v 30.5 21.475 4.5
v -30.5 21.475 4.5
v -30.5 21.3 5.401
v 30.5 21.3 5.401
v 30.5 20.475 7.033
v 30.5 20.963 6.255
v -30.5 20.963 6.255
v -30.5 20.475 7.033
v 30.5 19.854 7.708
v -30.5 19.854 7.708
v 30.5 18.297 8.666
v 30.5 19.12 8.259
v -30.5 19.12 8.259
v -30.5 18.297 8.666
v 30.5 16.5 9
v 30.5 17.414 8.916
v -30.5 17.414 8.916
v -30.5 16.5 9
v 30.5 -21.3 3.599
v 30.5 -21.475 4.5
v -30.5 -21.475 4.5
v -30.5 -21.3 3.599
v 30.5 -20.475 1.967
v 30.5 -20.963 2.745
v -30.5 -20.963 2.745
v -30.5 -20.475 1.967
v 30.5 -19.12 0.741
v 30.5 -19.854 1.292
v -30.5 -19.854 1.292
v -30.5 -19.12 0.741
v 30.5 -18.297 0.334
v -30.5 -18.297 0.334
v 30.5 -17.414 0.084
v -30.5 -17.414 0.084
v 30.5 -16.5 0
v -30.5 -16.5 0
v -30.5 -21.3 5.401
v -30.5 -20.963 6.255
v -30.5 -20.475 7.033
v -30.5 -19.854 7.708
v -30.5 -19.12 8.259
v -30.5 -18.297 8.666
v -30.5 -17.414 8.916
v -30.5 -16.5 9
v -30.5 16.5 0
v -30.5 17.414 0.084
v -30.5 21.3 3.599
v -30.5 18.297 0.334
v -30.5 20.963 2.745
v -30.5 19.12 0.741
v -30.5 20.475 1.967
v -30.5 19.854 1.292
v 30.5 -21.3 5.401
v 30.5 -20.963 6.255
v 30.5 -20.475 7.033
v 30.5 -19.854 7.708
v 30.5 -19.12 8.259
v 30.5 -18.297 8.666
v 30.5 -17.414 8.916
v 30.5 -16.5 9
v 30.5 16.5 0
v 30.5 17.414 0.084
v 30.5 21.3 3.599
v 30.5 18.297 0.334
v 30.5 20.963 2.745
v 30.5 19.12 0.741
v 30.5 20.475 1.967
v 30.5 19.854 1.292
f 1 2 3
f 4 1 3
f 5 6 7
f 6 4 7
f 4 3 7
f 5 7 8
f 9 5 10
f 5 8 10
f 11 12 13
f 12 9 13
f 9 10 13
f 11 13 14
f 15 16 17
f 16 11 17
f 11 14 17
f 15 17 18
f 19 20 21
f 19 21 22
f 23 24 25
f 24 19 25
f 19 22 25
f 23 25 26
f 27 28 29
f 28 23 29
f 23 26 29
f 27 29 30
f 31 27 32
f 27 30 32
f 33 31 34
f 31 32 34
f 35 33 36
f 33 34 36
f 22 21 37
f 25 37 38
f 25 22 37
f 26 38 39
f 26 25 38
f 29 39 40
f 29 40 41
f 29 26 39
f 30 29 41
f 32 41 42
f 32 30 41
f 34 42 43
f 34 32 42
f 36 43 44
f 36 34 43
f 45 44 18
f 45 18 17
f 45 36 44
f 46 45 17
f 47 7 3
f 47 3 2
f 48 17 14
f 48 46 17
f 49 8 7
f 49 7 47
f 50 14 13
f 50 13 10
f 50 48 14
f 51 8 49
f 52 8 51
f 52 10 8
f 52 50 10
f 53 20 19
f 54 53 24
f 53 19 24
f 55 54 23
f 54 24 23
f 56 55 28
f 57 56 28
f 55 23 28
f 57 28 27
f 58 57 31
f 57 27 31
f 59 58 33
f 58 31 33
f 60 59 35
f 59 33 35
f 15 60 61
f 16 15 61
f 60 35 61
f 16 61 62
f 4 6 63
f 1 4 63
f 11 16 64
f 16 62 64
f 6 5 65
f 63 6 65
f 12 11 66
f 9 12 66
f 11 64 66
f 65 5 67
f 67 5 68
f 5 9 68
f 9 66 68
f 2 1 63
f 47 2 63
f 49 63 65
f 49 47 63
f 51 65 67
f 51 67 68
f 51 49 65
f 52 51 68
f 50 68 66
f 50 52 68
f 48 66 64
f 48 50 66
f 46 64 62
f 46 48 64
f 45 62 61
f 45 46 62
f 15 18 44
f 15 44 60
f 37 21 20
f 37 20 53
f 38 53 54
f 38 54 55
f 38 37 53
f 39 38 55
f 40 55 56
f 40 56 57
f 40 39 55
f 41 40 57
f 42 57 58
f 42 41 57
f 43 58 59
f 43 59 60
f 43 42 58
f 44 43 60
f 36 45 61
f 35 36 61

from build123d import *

# Parameters (mm, degrees)
F0_W        = 61
F0_H        = 43
F1_DEPTH    = 9
F2_T1_DEPTH = 86


# Not quite as in the source:
# - a fillet or chamfer that OpenCascade refuses, or shapes differently, is made with other operations: its cross-section is extruded or revolved along the edge and cut away or added


with BuildPart() as f1:
    # F0 (on Top) → F1 (new body)
    with BuildSketch(Plane.XY):
        Rectangle(F0_W, F0_H)
    extrude(amount=F1_DEPTH)

    # F2: fillet of radius 5 on 4 edges, made by hand

    # F2_s2 → F2_t1 (cut)
    with BuildSketch(Plane.YZ.offset(-43)):
        with BuildLine():
            ThreePointArc((21.5, 4), (20.0355339059, 7.5355339059), (16.5, 9))
            Line((16.5, 9), (21.5, 9))
            Line((21.5, 9), (21.5, 4))
        make_face()
        with BuildLine():
            ThreePointArc((-21.5, 4), (-20.0355339059, 7.5355339059), (-16.5, 9))
            Line((-16.5, 9), (-21.5, 9))
            Line((-21.5, 9), (-21.5, 4))
        make_face()
        with BuildLine():
            ThreePointArc((-21.5, 5), (-20.0355339059, 1.4644660941), (-16.5, 0))
            Line((-16.5, 0), (-21.5, 0))
            Line((-21.5, 0), (-21.5, 5))
        make_face()
        with BuildLine():
            ThreePointArc((21.5, 5), (20.0355339059, 1.4644660941), (16.5, 0))
            Line((16.5, 0), (21.5, 0))
            Line((21.5, 0), (21.5, 5))
        make_face()
    extrude(amount=F2_T1_DEPTH, mode=Mode.SUBTRACT)


solid = f1.part
